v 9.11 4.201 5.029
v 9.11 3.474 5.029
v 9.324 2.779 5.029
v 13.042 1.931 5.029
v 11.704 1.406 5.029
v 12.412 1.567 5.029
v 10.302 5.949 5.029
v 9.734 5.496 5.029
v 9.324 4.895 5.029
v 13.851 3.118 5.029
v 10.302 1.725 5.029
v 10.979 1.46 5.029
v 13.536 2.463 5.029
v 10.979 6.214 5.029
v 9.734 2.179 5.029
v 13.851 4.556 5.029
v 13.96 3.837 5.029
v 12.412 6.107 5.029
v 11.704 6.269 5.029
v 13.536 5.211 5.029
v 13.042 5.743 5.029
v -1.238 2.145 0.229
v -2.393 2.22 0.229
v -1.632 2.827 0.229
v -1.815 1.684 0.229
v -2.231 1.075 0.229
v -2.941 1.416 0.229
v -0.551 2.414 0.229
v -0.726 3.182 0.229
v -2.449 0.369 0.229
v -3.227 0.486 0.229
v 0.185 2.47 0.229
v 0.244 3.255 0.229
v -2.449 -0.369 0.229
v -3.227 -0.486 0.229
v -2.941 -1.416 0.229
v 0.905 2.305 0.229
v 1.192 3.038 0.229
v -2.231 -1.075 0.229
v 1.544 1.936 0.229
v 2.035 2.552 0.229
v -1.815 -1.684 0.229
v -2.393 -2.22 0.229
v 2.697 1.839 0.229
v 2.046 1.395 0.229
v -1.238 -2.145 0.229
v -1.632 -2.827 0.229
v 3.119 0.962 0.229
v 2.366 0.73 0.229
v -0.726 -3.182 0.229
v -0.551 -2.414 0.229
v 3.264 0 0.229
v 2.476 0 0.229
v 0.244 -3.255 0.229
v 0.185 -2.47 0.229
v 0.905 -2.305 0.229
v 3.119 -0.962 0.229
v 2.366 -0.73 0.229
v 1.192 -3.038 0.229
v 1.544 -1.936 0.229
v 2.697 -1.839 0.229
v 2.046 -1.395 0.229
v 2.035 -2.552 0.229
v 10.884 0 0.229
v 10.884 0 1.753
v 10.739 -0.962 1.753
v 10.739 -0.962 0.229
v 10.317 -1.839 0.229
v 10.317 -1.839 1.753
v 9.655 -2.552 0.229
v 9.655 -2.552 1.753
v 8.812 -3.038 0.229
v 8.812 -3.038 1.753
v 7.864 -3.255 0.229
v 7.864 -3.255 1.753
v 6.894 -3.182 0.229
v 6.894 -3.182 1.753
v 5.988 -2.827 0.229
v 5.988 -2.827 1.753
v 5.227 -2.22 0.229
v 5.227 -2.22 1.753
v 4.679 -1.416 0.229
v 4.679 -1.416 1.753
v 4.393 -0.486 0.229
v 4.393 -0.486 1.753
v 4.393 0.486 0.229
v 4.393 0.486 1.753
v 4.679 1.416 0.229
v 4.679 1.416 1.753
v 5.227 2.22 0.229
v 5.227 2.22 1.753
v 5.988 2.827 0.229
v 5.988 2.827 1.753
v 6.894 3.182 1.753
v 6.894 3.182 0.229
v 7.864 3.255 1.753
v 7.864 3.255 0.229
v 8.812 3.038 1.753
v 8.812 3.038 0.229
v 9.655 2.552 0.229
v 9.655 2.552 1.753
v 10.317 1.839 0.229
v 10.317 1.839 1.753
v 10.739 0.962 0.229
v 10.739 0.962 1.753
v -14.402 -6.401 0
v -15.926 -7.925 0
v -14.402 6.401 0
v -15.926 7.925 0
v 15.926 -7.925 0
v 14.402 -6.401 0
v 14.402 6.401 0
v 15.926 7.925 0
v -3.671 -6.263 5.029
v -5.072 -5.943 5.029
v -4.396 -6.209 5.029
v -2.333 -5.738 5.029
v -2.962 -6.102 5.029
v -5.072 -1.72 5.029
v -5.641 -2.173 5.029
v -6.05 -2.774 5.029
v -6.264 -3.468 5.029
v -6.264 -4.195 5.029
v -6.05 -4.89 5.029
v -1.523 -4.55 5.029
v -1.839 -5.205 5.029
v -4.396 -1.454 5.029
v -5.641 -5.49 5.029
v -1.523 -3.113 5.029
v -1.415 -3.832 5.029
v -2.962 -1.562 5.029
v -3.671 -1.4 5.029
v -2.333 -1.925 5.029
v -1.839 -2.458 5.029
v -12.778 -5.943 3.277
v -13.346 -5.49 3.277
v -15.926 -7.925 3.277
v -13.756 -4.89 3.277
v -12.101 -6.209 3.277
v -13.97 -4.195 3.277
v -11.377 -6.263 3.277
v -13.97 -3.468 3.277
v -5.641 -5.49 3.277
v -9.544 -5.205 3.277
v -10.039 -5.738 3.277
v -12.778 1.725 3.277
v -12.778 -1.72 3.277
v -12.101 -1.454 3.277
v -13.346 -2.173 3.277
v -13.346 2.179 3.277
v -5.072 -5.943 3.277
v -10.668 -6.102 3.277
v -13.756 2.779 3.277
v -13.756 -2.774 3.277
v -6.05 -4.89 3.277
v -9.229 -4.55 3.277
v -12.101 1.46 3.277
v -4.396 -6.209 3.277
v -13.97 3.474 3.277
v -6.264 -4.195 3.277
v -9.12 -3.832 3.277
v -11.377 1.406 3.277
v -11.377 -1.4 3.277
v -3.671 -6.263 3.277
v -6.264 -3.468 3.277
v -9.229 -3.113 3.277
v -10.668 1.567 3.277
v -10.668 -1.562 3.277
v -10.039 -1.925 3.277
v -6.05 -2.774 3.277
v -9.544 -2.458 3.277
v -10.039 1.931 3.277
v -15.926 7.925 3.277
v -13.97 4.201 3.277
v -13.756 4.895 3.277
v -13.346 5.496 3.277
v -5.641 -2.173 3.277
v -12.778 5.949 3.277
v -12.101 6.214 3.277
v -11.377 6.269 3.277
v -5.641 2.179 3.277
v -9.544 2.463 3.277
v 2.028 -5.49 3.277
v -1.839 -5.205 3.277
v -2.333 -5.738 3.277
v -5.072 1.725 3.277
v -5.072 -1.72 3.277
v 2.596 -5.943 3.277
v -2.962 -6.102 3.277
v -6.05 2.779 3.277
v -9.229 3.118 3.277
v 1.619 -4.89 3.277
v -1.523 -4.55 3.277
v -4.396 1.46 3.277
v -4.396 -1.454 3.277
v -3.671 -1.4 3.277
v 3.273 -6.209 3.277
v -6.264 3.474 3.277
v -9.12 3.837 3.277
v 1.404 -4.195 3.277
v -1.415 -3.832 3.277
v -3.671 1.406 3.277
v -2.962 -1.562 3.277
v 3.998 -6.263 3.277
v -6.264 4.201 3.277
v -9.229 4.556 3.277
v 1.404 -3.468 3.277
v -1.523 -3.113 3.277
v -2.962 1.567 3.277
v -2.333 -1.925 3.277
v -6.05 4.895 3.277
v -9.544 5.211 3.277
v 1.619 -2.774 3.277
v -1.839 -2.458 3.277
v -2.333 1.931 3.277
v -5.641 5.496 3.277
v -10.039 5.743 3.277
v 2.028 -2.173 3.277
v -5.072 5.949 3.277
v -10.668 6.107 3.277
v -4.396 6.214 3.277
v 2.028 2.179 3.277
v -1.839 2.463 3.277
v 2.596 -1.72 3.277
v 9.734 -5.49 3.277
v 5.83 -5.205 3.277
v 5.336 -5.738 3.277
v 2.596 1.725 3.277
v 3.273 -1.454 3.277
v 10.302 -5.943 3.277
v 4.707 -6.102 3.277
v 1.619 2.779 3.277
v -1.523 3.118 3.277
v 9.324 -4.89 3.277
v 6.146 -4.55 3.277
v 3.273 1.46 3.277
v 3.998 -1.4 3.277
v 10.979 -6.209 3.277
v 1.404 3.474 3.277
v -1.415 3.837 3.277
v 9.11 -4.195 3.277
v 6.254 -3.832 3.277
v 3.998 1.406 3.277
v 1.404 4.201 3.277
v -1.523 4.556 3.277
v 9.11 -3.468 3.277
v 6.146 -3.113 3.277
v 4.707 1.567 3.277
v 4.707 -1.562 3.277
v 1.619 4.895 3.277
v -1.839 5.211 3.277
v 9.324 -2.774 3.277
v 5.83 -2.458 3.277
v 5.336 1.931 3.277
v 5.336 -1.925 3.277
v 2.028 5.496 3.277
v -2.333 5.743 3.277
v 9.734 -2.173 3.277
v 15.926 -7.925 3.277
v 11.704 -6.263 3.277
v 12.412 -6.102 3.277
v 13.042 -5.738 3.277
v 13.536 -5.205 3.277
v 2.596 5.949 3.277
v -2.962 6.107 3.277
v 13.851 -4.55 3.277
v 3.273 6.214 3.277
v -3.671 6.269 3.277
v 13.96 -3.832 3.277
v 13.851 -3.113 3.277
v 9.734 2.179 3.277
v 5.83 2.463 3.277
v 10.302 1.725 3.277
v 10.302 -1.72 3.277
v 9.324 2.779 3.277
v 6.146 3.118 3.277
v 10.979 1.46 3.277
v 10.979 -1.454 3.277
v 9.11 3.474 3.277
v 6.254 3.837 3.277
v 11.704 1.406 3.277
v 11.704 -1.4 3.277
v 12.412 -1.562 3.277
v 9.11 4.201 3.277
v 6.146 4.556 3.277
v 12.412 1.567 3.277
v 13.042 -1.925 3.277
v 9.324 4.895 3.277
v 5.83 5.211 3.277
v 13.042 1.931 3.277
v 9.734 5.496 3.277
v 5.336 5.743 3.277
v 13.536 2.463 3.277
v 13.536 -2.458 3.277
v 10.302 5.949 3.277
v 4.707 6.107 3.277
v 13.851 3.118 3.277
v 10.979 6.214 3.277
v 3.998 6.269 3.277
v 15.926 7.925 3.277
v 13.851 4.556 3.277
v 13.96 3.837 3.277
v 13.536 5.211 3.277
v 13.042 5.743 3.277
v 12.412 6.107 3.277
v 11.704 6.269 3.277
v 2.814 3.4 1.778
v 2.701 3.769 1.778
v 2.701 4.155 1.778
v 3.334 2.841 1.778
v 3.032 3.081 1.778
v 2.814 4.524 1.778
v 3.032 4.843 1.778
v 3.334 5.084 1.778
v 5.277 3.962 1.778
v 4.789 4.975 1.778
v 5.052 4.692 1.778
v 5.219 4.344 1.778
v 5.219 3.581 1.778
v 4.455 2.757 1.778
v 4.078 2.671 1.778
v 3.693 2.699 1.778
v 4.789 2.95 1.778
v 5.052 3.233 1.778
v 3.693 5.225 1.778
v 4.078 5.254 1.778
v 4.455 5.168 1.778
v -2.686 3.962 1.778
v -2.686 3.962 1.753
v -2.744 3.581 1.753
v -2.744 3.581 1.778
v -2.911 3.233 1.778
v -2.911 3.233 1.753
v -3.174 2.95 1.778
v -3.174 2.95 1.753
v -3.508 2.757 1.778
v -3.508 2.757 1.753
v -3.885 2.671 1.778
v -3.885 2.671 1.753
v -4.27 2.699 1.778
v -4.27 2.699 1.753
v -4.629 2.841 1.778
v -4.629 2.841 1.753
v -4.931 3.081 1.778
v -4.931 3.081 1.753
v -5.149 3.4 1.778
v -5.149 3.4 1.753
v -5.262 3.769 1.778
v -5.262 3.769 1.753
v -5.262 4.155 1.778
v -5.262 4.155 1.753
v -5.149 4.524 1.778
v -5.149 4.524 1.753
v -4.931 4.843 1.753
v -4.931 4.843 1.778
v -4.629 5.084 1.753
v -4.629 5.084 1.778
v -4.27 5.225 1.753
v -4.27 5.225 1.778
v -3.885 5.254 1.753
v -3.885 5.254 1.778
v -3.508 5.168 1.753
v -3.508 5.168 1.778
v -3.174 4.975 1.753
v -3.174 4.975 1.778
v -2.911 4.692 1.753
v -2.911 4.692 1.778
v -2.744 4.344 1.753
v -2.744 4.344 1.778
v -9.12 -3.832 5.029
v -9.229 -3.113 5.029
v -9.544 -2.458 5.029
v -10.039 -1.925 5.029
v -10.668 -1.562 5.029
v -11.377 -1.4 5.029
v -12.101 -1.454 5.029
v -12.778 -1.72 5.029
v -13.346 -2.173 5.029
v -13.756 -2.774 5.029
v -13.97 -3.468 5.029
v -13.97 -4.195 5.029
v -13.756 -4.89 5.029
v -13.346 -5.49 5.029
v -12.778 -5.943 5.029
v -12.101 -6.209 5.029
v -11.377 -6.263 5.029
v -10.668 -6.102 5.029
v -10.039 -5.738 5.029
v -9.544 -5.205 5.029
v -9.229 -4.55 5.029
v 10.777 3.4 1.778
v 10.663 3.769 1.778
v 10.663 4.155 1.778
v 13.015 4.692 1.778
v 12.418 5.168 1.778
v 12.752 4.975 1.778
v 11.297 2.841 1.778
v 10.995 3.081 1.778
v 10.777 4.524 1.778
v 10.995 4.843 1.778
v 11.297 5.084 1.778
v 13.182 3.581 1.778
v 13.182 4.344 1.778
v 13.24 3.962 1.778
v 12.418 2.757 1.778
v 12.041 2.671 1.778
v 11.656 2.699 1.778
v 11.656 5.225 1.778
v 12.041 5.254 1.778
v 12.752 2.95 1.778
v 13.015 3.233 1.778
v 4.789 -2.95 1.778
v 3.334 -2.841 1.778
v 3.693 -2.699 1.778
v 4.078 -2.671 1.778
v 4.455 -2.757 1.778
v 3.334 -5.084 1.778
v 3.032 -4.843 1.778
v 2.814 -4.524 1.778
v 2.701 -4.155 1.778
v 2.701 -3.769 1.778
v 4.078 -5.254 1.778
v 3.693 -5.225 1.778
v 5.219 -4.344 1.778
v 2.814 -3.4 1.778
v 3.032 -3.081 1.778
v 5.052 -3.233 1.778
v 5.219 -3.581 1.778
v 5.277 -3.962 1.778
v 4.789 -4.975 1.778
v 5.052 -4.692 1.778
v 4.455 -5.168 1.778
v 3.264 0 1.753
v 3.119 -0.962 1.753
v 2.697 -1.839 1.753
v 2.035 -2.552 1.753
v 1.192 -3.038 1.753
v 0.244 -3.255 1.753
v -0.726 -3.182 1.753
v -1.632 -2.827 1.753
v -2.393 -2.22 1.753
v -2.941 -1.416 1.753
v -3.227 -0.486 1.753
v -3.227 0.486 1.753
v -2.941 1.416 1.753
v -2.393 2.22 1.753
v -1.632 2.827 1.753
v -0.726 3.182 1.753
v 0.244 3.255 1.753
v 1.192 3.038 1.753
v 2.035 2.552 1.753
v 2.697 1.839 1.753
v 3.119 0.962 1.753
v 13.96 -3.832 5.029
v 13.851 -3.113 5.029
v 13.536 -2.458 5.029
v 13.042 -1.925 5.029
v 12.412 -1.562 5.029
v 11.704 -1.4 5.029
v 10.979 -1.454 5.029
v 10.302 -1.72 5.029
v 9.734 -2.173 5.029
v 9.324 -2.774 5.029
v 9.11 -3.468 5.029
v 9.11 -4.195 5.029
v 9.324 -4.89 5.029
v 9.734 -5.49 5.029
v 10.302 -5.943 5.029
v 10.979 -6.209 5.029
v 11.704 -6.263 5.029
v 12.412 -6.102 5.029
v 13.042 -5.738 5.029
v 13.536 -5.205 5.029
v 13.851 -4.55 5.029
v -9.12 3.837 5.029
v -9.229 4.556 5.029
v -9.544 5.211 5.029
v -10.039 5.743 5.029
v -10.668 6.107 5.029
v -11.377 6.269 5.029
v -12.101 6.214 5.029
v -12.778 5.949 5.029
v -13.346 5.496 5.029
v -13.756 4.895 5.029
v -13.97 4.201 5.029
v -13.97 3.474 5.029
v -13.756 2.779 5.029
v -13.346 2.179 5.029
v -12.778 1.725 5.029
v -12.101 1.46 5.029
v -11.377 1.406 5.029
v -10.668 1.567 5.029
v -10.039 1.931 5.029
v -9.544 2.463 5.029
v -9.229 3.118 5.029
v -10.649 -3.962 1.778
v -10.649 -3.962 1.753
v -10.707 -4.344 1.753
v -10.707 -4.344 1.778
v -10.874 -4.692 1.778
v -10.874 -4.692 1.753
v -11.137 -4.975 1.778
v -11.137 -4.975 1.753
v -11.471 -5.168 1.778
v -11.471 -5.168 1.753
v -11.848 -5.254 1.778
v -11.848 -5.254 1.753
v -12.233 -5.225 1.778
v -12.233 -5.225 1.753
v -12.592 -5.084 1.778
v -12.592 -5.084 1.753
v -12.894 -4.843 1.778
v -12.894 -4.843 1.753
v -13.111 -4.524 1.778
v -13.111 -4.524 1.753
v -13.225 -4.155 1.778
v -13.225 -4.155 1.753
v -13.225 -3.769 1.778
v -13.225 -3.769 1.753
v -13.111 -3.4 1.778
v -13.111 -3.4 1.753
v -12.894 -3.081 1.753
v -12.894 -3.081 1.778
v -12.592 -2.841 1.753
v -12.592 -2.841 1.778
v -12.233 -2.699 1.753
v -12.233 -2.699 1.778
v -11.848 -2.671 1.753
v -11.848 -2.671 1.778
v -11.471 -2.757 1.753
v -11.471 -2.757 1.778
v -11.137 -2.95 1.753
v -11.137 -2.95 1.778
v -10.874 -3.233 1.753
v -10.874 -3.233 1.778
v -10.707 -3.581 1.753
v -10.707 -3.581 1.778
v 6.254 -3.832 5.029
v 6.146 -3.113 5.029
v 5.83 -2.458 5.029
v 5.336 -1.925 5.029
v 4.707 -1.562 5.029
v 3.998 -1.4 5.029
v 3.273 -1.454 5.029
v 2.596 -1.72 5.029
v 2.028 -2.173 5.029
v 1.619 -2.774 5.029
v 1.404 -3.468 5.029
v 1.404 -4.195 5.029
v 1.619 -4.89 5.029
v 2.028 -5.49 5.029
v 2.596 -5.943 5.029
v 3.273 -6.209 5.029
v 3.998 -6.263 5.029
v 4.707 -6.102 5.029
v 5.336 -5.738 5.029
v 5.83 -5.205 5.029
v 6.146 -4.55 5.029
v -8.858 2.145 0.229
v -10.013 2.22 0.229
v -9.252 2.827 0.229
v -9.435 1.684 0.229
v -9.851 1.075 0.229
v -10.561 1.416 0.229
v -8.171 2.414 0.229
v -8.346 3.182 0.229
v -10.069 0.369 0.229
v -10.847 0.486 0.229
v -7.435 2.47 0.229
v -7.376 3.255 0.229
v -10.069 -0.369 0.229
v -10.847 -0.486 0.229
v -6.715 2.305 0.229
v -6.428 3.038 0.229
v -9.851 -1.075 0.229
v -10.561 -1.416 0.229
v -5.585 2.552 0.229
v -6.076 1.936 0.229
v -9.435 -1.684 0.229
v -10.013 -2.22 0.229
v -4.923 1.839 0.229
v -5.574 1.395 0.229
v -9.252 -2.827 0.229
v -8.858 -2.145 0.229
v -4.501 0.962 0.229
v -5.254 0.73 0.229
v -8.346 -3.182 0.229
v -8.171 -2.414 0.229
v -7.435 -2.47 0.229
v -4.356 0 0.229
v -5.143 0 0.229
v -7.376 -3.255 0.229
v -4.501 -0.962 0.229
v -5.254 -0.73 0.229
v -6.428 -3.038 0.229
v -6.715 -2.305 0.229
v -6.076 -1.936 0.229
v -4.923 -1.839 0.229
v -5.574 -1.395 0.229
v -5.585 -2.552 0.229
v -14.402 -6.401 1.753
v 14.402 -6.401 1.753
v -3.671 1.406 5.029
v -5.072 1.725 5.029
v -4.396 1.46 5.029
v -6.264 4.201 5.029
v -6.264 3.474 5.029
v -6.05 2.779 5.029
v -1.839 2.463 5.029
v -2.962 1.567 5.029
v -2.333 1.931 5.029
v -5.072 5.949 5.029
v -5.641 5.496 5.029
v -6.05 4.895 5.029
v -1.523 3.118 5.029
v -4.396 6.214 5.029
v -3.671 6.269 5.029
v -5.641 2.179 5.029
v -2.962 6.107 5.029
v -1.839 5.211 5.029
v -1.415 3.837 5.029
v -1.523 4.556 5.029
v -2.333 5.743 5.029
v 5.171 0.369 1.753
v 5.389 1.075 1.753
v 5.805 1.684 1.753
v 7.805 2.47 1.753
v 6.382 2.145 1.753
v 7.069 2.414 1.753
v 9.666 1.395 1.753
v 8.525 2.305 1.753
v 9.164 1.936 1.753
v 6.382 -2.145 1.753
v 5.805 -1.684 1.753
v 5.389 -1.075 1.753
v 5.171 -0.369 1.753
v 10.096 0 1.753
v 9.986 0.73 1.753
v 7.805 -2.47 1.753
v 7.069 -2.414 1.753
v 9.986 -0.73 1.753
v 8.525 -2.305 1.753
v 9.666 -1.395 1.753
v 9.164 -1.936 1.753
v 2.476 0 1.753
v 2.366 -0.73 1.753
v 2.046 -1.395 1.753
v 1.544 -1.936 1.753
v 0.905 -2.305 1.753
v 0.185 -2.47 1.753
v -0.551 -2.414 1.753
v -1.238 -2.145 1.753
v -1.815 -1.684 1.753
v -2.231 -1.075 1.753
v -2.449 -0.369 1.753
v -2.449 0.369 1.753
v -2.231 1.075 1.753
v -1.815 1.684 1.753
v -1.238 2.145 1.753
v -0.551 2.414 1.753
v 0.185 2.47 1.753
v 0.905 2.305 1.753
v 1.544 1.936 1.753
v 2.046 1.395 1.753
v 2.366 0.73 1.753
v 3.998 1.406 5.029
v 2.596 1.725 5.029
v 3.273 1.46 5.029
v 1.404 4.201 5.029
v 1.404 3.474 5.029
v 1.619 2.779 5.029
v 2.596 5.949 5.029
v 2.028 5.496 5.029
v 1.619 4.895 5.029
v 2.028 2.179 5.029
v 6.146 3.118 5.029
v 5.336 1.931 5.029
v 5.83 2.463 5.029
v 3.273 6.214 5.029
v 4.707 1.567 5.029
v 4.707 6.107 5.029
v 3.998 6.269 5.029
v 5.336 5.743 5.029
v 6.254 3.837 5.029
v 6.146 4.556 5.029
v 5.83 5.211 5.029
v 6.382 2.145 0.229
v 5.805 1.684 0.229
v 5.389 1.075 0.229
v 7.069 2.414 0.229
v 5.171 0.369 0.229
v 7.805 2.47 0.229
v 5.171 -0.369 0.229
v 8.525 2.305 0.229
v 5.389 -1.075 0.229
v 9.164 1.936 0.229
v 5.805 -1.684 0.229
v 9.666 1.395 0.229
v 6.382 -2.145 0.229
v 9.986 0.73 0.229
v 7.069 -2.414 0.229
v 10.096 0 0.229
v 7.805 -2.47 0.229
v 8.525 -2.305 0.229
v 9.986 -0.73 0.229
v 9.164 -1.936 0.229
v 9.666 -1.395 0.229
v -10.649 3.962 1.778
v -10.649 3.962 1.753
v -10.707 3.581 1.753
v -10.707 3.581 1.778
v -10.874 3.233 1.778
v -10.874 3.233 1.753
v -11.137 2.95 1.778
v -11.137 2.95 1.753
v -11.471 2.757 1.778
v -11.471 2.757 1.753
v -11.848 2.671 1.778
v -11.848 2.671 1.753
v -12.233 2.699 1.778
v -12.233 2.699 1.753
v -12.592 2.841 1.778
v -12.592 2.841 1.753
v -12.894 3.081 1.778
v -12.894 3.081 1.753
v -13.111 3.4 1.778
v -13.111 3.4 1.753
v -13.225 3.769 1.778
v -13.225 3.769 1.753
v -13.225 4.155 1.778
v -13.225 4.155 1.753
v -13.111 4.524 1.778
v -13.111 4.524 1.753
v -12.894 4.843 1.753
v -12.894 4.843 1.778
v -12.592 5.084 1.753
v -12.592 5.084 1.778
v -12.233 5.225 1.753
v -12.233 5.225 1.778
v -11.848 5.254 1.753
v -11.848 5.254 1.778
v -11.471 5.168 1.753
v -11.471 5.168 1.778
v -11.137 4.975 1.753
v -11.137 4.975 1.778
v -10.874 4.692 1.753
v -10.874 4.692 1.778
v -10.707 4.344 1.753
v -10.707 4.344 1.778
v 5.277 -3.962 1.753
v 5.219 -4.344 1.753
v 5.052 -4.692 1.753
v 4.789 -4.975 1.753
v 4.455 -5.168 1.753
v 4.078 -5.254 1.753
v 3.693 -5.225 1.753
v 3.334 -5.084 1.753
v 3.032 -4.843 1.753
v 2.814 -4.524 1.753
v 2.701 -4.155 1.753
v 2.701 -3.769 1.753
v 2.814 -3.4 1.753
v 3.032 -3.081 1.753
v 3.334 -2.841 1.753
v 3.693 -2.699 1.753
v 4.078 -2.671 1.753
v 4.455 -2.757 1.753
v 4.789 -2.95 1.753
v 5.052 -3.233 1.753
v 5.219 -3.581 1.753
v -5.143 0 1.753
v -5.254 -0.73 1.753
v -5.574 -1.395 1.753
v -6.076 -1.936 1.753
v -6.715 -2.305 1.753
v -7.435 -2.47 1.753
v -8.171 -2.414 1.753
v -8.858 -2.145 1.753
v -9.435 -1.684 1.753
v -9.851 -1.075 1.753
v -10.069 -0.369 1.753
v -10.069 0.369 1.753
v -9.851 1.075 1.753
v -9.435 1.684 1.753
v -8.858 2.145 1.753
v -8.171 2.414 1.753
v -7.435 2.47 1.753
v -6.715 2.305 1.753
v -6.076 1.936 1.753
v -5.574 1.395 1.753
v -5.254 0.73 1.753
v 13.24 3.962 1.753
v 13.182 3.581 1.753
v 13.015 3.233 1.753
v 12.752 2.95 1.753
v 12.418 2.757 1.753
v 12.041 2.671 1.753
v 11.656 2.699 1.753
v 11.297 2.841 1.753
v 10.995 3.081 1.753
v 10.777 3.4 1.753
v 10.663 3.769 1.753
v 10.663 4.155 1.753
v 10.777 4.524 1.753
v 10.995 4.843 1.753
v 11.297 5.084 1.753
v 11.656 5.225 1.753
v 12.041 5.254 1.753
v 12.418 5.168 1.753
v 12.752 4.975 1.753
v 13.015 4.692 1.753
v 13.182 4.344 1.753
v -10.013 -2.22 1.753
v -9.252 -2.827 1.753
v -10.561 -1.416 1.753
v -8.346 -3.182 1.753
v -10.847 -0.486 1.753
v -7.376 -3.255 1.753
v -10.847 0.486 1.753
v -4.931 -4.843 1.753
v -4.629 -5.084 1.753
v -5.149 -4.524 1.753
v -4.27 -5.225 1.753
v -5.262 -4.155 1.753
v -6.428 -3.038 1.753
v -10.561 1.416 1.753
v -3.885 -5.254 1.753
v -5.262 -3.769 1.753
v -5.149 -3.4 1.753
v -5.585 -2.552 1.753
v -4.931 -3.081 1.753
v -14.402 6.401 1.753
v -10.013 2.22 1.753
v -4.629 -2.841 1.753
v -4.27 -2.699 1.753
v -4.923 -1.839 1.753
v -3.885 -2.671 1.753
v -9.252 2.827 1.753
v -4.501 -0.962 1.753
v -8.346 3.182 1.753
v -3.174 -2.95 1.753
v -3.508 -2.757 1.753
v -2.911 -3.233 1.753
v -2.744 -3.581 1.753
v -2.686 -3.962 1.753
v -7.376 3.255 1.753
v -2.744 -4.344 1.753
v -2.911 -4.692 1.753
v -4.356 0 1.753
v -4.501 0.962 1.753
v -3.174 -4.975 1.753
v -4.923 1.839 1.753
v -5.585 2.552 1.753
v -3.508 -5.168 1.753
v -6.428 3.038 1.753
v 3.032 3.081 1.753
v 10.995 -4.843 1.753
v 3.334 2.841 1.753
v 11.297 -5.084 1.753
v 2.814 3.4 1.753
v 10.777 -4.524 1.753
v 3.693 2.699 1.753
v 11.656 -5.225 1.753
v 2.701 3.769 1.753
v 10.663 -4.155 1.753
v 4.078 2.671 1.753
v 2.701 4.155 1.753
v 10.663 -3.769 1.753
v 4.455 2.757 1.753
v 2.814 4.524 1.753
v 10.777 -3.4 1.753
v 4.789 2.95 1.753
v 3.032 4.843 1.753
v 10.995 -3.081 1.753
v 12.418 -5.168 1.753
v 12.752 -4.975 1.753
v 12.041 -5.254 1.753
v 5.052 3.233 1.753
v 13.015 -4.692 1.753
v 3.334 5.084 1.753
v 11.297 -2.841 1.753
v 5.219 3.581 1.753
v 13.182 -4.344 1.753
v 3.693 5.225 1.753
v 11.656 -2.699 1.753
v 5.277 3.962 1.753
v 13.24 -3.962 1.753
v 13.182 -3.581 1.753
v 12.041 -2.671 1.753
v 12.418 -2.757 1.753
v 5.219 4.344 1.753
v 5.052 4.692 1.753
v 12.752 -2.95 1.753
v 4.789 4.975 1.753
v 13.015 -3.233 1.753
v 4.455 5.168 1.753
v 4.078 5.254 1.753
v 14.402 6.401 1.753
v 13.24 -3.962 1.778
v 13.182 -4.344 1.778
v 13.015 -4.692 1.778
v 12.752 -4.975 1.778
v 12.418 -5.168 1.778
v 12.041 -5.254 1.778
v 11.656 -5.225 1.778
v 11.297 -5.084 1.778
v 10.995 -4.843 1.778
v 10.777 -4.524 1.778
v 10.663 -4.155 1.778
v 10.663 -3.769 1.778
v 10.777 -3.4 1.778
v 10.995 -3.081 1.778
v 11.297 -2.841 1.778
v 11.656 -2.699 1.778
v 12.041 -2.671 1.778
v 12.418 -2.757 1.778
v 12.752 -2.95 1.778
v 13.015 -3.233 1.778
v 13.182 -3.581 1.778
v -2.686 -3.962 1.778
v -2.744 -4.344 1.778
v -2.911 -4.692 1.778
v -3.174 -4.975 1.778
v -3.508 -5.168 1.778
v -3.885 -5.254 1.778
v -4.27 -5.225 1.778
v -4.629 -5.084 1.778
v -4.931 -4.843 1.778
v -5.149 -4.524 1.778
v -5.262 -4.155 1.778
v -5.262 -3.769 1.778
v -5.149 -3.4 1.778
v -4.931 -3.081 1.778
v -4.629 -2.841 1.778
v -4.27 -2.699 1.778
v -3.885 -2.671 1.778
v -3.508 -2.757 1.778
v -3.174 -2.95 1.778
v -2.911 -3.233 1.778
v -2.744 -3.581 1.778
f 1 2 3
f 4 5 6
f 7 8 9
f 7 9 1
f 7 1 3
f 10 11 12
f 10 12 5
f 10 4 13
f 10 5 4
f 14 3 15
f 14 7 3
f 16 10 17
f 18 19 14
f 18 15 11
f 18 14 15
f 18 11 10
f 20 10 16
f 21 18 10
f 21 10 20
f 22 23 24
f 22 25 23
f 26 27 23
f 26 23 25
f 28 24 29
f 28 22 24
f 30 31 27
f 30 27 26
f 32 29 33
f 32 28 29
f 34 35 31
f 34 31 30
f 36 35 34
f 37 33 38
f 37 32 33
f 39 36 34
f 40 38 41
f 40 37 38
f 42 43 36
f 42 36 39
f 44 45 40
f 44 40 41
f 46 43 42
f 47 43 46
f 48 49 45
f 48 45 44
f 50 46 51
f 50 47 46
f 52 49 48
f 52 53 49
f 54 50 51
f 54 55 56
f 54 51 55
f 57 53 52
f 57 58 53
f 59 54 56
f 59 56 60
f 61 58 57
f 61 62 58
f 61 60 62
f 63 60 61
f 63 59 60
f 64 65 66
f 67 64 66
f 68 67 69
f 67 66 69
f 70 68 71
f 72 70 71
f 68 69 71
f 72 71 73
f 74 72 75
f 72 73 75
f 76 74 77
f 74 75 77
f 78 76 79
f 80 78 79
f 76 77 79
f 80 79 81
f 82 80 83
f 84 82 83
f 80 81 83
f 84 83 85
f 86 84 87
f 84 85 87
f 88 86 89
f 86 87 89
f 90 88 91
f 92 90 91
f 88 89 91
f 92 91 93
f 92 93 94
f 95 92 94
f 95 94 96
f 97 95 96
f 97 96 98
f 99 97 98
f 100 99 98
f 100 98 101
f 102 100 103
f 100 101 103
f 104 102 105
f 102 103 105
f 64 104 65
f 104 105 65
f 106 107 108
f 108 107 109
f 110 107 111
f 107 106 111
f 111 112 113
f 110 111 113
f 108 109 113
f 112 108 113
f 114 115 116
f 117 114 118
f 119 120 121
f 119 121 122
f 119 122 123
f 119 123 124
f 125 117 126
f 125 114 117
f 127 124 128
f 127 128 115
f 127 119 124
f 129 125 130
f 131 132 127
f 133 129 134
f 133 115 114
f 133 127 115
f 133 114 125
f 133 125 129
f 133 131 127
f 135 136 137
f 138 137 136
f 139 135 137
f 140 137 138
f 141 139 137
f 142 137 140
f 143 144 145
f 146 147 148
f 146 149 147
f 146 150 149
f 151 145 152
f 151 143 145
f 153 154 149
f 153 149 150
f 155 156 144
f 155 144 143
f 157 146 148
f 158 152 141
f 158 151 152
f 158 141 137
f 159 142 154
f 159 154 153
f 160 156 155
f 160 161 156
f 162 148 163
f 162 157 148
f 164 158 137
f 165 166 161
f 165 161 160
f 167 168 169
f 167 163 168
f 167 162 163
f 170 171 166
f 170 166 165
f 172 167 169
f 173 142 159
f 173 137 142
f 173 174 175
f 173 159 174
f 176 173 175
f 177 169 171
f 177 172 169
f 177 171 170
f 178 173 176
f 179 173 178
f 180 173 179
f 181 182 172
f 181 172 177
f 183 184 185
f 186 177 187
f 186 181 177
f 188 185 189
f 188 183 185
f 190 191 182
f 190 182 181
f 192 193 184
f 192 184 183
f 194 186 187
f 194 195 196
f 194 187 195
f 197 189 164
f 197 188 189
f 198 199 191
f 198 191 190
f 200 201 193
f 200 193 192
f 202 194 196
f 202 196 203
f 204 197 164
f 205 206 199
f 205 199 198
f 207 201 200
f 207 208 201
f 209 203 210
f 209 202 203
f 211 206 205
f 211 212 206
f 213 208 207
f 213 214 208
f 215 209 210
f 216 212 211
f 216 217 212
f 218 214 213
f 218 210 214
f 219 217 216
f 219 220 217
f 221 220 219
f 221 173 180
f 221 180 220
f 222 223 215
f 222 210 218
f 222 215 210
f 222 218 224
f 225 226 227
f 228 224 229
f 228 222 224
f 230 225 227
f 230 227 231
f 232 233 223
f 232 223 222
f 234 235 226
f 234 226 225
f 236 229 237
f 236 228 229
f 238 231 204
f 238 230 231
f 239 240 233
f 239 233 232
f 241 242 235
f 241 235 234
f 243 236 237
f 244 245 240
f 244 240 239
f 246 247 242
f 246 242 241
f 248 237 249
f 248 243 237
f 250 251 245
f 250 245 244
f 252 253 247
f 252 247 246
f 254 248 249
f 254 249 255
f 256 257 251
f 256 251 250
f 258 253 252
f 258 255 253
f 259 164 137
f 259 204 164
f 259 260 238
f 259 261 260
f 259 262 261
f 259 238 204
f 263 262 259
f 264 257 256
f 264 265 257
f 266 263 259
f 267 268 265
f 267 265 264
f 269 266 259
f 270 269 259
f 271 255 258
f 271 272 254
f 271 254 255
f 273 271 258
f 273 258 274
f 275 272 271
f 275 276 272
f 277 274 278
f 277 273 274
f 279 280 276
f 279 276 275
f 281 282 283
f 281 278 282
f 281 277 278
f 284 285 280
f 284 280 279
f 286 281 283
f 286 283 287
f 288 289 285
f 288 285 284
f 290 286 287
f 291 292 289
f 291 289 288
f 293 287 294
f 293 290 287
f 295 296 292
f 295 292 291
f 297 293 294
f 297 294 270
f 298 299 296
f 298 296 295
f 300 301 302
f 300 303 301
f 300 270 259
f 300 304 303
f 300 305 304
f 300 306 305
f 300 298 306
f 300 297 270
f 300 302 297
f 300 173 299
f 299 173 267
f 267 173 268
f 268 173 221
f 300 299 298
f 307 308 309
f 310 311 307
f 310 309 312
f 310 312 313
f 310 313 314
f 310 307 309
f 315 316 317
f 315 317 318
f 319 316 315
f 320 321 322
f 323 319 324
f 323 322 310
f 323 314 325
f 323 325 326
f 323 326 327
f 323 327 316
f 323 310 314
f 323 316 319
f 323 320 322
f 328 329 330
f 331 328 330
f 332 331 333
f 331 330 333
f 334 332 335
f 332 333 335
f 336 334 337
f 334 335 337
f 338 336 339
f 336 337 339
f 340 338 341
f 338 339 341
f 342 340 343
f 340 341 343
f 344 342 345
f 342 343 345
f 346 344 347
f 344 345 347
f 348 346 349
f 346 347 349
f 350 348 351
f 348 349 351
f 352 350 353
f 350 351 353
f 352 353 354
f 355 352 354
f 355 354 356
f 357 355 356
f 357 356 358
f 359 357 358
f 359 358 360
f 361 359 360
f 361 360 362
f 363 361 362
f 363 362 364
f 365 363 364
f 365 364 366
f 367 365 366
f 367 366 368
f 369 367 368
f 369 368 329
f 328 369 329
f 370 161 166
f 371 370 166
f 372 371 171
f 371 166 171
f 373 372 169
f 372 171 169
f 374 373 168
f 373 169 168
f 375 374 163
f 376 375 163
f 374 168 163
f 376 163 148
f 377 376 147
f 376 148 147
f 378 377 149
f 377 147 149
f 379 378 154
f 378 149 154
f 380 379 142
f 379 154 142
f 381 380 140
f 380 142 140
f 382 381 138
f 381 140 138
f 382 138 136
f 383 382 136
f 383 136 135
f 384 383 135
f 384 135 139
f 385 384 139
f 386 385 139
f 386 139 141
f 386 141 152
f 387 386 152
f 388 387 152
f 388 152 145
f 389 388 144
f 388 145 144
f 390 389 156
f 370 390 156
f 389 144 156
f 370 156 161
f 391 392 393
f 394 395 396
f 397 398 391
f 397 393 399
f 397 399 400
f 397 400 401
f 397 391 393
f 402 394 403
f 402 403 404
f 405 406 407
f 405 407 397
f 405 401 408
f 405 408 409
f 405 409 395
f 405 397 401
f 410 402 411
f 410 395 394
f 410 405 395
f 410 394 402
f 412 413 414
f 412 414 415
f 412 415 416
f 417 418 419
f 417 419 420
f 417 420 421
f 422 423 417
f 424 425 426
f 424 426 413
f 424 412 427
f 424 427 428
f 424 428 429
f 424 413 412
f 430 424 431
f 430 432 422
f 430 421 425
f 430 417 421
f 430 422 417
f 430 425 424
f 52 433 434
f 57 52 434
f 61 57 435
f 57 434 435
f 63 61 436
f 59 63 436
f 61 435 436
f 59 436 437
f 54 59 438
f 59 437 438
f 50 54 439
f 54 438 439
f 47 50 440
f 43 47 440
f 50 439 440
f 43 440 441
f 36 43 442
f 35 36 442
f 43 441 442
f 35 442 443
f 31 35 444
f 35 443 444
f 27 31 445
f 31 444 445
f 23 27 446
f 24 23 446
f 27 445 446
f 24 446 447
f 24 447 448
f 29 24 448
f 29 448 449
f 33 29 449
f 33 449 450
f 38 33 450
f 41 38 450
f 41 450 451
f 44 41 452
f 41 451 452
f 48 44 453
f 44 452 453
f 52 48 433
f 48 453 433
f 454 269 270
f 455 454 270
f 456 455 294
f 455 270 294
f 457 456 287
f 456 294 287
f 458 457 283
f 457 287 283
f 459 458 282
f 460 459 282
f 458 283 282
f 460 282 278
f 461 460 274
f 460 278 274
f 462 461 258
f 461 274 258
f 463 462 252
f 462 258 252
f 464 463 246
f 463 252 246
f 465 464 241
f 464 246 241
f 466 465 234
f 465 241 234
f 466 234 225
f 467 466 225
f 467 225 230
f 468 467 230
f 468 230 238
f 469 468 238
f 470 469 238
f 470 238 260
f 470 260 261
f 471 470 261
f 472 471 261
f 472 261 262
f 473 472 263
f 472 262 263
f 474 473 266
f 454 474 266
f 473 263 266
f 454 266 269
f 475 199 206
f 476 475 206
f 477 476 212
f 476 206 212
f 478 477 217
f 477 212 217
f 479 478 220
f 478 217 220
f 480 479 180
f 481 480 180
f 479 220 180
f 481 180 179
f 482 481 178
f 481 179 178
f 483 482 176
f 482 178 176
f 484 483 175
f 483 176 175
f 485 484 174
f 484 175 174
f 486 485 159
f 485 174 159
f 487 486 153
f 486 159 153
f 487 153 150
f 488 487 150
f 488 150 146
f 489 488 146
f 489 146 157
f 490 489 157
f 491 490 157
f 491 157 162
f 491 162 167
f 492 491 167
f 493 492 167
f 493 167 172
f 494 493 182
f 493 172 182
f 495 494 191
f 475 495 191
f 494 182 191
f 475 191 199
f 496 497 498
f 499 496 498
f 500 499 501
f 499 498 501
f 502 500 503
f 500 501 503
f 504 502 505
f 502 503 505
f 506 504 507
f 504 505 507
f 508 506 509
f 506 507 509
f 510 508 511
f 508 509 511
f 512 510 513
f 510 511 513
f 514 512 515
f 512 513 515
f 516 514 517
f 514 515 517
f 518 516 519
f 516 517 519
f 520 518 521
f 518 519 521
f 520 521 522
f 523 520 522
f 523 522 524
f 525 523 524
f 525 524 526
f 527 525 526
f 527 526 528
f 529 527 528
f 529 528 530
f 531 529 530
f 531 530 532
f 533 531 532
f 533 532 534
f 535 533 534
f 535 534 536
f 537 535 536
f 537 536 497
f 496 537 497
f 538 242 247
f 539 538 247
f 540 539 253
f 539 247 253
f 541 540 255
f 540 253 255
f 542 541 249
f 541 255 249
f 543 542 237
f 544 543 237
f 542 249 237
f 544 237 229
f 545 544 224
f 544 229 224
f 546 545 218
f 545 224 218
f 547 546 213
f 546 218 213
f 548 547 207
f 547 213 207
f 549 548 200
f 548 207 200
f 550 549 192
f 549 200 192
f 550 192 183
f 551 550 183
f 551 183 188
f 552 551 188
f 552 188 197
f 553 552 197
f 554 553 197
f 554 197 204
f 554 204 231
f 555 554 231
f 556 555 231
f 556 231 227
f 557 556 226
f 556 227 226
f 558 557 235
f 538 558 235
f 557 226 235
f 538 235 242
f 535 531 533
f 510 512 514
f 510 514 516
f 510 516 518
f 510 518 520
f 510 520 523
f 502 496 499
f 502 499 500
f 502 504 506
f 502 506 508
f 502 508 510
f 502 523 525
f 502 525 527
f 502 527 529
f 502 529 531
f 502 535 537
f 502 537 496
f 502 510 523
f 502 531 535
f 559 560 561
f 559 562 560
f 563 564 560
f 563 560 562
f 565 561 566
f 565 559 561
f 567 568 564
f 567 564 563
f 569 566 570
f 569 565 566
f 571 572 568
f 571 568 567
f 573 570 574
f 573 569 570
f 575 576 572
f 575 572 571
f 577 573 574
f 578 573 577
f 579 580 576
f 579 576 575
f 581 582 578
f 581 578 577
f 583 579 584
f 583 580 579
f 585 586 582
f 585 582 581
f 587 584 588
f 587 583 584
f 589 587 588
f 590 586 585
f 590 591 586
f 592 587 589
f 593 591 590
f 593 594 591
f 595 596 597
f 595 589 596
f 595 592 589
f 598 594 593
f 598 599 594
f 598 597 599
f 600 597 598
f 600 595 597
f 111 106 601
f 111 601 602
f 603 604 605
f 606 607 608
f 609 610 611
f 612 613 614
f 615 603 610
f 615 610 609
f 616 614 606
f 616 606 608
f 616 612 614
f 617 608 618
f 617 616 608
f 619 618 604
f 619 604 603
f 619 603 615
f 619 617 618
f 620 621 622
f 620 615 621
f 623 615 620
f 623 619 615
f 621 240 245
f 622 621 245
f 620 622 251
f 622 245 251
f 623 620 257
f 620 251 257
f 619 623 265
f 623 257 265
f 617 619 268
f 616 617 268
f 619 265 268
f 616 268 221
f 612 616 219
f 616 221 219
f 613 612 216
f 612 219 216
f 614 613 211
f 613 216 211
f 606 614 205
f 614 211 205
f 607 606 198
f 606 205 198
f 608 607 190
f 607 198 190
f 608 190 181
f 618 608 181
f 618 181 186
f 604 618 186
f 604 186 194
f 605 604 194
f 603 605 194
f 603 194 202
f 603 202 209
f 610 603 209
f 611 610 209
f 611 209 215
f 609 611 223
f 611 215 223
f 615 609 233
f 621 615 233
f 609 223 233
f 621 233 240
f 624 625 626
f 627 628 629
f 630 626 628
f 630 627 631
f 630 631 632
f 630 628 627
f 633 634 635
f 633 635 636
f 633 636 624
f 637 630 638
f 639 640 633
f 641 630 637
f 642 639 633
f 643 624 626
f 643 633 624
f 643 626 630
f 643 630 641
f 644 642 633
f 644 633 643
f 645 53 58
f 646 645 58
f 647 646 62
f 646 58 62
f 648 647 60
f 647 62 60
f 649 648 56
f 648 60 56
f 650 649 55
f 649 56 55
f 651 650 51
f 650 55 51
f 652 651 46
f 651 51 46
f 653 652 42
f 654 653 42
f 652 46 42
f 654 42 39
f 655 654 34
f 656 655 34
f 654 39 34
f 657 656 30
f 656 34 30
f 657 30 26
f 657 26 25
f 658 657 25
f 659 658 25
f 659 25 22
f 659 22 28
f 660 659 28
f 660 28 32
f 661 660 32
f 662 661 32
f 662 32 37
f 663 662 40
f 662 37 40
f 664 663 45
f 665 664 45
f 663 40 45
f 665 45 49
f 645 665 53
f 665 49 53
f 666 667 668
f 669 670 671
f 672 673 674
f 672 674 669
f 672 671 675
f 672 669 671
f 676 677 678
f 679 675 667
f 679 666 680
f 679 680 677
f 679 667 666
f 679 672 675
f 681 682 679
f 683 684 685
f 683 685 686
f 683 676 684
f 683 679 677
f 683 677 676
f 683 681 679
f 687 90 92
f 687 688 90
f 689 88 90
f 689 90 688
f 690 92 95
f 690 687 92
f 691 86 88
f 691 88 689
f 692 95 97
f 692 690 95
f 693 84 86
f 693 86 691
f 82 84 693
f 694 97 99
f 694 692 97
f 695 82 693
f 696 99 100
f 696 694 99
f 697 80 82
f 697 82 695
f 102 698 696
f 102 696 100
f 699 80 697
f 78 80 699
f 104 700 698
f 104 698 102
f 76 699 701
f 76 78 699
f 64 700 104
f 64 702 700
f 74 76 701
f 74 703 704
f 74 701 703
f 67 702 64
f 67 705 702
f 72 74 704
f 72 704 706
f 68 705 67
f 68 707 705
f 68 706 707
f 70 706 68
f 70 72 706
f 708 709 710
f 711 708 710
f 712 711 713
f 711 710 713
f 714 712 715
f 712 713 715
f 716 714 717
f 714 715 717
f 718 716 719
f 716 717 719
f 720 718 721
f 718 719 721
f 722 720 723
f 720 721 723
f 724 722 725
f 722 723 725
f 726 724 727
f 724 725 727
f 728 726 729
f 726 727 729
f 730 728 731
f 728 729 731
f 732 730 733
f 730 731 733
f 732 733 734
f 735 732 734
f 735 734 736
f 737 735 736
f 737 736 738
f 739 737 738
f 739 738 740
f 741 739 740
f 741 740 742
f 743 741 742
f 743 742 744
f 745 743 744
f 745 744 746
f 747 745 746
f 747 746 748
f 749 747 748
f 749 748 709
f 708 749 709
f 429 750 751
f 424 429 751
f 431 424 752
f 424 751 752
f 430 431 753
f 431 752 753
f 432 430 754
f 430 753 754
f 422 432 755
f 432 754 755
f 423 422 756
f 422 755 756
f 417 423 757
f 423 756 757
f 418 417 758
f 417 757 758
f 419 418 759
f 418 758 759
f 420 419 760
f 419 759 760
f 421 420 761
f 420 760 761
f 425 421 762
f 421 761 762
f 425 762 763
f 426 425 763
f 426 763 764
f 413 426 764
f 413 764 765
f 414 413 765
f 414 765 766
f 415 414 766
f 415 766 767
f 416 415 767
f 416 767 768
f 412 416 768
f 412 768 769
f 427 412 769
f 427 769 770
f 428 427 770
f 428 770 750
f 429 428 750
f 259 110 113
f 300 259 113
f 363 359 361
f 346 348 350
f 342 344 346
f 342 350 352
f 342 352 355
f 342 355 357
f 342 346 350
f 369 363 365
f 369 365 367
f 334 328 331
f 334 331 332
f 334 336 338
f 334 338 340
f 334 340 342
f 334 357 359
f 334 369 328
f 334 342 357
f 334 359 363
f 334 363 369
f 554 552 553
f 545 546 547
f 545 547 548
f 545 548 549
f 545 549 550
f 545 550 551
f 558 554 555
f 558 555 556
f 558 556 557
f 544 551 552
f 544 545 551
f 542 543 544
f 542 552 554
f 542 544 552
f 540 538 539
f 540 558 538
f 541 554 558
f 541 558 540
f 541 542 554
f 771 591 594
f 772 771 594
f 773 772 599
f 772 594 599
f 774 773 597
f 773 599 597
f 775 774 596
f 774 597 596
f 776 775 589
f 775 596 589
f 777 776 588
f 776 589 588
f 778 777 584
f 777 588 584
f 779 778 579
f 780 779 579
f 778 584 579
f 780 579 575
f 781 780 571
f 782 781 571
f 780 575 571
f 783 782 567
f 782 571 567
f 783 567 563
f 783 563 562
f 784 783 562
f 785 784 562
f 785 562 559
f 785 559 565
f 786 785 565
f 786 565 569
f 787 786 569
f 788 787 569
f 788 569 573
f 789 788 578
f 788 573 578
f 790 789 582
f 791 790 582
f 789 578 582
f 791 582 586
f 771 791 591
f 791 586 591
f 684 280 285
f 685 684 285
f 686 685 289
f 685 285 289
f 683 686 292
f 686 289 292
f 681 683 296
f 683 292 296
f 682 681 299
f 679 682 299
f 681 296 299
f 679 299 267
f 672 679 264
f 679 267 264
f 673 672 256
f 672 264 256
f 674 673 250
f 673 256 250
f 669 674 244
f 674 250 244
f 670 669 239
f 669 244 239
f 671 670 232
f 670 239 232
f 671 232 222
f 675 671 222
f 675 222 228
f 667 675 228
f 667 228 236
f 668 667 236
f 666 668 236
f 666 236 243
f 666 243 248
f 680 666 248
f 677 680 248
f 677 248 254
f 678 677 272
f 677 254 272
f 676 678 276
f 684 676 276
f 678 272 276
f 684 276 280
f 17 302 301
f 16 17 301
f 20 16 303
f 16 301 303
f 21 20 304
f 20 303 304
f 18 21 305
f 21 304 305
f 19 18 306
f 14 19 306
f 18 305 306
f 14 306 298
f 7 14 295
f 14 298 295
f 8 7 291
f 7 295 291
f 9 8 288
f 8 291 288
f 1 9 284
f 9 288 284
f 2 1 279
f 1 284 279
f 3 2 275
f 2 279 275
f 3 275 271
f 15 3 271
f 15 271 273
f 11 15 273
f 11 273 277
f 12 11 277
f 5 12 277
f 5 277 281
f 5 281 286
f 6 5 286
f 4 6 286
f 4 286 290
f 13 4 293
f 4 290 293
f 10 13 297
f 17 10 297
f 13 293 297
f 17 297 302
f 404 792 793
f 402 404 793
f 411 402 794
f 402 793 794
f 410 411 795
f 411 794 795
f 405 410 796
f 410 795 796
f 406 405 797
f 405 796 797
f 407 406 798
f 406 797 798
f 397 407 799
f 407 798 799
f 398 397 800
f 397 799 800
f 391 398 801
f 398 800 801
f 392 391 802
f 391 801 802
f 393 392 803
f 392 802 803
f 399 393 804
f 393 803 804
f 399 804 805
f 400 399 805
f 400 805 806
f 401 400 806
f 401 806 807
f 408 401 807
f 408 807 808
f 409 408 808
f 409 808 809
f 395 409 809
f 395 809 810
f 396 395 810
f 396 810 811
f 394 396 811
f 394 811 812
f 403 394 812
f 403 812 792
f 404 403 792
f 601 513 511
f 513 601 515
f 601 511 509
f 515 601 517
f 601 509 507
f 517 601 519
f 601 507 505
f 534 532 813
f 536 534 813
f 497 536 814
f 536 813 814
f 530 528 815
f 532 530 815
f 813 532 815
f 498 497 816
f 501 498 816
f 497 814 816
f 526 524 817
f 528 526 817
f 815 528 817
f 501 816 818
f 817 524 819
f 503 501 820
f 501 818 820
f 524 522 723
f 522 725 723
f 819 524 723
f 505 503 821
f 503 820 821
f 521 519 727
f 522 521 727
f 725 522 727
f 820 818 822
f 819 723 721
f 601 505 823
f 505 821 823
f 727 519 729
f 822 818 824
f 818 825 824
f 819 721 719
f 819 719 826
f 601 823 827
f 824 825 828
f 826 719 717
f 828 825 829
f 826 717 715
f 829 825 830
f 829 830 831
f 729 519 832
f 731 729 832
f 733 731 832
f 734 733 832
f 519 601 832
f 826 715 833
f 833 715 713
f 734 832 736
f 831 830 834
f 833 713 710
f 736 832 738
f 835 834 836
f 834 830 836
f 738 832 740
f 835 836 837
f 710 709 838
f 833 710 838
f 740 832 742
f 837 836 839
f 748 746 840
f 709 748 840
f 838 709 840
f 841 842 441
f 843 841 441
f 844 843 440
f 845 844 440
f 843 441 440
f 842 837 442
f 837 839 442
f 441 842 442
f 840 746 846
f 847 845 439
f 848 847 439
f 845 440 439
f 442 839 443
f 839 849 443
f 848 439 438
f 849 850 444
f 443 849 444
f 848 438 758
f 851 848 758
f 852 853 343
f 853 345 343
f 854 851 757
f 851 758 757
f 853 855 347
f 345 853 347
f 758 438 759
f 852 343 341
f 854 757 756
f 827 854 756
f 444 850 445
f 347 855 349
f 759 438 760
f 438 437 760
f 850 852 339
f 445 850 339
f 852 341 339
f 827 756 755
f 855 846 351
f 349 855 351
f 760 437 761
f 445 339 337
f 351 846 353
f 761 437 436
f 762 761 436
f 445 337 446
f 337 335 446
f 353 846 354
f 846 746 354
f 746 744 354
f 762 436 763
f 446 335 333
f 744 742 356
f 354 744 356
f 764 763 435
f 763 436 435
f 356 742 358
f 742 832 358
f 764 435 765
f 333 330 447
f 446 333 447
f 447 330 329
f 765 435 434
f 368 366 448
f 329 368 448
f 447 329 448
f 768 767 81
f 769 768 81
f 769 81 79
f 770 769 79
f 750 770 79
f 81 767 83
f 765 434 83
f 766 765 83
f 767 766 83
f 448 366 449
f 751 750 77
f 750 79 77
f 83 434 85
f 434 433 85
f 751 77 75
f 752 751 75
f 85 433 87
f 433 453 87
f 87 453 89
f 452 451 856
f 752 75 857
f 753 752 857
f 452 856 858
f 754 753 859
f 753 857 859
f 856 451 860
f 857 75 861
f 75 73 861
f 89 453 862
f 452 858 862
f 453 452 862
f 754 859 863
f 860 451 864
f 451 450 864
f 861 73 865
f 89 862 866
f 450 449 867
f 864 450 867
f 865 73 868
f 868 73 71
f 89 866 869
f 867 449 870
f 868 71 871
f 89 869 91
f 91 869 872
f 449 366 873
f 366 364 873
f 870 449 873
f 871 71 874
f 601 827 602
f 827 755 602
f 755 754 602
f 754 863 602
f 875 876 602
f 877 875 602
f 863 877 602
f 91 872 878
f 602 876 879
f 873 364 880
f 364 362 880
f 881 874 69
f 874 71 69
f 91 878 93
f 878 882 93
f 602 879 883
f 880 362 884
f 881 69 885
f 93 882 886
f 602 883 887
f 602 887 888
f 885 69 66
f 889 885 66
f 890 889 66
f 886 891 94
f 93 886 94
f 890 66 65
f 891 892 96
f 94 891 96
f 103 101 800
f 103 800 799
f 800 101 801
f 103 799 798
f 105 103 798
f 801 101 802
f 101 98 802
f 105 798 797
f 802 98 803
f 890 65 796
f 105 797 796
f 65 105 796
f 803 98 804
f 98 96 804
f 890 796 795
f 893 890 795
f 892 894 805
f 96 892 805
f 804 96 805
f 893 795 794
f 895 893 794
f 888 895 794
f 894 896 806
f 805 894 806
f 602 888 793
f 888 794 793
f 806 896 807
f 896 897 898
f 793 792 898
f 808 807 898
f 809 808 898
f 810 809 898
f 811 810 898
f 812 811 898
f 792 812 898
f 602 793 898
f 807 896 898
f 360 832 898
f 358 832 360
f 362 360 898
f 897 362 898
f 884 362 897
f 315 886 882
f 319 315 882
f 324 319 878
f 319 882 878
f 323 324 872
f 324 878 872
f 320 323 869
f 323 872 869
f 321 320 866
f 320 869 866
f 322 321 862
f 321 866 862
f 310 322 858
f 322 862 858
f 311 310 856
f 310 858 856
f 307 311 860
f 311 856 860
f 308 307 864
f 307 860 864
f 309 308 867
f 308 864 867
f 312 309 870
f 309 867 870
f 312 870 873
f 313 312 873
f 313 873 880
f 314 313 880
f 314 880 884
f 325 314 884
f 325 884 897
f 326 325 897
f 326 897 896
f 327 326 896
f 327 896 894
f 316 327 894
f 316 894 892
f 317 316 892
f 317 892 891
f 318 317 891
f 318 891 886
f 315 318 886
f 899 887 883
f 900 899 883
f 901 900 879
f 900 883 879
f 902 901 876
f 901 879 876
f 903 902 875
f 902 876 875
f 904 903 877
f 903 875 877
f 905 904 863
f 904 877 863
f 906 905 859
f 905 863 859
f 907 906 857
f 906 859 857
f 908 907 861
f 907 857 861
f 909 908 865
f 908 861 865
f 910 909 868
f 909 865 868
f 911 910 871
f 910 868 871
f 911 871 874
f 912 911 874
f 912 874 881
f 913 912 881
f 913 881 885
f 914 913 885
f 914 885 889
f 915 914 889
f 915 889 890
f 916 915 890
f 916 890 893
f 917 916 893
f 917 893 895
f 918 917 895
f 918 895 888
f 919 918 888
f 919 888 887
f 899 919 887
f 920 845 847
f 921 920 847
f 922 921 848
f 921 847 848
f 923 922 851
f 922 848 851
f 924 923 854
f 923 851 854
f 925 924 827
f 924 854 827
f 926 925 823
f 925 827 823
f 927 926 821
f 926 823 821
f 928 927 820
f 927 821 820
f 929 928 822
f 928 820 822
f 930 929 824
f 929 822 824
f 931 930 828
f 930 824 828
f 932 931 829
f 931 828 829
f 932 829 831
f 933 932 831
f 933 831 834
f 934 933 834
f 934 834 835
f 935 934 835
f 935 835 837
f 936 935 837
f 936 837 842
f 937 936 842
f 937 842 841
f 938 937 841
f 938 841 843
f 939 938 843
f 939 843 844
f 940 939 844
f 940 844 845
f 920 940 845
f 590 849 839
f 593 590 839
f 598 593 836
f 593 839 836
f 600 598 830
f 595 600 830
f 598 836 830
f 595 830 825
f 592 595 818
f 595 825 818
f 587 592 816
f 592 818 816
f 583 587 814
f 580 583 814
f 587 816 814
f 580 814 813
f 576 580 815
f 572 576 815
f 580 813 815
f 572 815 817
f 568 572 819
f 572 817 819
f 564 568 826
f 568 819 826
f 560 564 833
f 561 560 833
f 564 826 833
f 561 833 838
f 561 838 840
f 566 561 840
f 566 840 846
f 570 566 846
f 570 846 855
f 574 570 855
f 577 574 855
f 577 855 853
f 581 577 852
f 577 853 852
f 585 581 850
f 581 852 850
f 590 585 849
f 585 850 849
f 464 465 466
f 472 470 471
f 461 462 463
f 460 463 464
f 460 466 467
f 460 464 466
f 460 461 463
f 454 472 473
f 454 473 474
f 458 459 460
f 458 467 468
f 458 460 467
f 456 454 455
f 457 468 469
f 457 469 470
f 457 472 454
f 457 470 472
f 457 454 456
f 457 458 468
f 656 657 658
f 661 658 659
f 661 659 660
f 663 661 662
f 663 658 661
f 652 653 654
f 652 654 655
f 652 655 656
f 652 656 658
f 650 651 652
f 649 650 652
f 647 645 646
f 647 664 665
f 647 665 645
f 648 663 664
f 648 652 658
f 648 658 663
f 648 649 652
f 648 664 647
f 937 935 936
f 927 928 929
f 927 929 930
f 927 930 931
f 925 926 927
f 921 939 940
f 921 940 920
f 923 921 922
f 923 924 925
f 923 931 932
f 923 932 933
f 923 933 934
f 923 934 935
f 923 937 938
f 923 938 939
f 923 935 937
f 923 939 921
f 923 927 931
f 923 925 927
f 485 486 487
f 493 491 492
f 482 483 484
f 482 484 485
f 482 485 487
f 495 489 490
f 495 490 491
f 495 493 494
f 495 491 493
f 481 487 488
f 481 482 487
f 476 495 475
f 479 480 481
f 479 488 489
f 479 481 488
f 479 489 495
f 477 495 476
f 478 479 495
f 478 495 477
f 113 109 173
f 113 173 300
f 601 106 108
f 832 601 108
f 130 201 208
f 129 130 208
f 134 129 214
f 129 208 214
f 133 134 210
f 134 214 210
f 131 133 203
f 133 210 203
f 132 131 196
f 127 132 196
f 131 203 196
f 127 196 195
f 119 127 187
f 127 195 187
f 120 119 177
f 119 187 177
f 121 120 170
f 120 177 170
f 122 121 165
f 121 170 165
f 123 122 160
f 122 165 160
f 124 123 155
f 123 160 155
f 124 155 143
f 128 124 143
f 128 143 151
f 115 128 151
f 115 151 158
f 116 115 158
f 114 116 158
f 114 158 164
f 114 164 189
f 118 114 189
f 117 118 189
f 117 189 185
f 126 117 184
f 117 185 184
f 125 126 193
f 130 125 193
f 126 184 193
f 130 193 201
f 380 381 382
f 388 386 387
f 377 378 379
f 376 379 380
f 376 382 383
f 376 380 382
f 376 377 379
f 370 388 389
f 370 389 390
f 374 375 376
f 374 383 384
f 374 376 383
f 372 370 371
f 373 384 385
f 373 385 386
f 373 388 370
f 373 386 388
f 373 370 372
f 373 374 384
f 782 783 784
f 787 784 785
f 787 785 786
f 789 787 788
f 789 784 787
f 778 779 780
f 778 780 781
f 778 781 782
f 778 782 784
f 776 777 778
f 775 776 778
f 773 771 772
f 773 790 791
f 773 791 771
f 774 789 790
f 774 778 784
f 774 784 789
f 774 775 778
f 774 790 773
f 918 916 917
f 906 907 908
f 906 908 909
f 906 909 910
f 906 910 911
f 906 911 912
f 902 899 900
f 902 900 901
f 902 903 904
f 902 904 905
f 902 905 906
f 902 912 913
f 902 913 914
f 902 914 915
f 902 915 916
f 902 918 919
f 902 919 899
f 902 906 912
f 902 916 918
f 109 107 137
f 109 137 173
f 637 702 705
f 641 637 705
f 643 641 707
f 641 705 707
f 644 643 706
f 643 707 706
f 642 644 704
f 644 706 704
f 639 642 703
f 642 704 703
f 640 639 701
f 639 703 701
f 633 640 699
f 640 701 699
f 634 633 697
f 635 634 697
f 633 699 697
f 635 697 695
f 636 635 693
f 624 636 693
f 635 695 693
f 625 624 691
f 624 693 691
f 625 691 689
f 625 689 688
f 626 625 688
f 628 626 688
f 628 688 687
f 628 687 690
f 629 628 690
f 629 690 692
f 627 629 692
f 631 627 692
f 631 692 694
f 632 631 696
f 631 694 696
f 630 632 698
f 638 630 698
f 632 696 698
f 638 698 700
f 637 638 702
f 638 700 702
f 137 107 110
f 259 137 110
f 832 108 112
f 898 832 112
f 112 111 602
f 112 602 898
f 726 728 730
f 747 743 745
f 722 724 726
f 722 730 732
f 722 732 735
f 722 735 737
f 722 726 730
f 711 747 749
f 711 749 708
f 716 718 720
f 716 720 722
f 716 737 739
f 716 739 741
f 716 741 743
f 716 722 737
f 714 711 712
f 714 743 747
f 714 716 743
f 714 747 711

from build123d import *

# Parameters (mm, degrees)
F0_W      = 31.8516
F0_H      = 15.8496
F1_DEPTH  = 3.2766
F2_T      = -1.524
F3_R      = 3.2639
F4_DEPTH  = 1.524
F5_R      = 2.4765
F8_DEPTH  = 1.524
F6_R      = 2.4765
F9_DEPTH  = 1.524
F7_R      = 2.4765
F10_DEPTH = 1.524
F11_R     = 2.4384
F12_DEPTH = 1.7526
F13_R     = 1.2954
F14_DEPTH = 1.778


with BuildPart() as f1:
    # F0 (on Top) → F1 (new body)
    with BuildSketch(Plane.XY):
        Rectangle(F0_W, F0_H)
    extrude(amount=F1_DEPTH)

    # F2
    f2_openings = [f1.faces().sort_by_distance(p)[0] for p in [
        (0, 0, 0),
    ]]
    offset(amount=F2_T, openings=f2_openings)

    # F3 (on face) → F4 (join)
    with BuildSketch(Plane(origin=(0, 0, 1.7526), x_dir=(1, 0, 0), z_dir=(0, 0, -1))):
        Circle(F3_R)
        with Locations((-7.62, 0)):
            Circle(F3_R)
        with Locations((7.62, 0)):
            Circle(F3_R)
    extrude(amount=F4_DEPTH)

    # F5 (on face) → F8 (cut)
    with BuildSketch(Plane(origin=(0, 0, 0.2286), x_dir=(1, 0, 0), z_dir=(0, 0, -1))):
        Circle(F5_R)
    extrude(amount=-F8_DEPTH, mode=Mode.SUBTRACT)

    # F6 (on face) → F9 (cut)
    with BuildSketch(Plane(origin=(0, 0, 0.2286), x_dir=(1, 0, 0), z_dir=(0, 0, -1))):
        with Locations((-7.62, 0)):
            Circle(F6_R)
    extrude(amount=-F9_DEPTH, mode=Mode.SUBTRACT)

    # F7 (on face) → F10 (cut)
    with BuildSketch(Plane(origin=(0, 0, 0.2286), x_dir=(1, 0, 0), z_dir=(0, 0, -1))):
        with Locations((7.62, 0)):
            Circle(F7_R)
    extrude(amount=-F10_DEPTH, mode=Mode.SUBTRACT)

    # F11 (on face) → F12 (join)
    with BuildSketch(Plane.XY.offset(3.2766)):
        with Locations((-11.55889, 3.837082)):
            Circle(F11_R)
        with Locations((-3.853228, 3.837082)):
            Circle(F11_R)
        with Locations((3.815653, 3.837082)):
            Circle(F11_R)
        with Locations((11.521315, 3.837082)):
            Circle(F11_R)
        with Locations((11.521315, -3.831711)):
            Circle(F11_R)
        with Locations((3.815653, -3.831711)):
            Circle(F11_R)
        with Locations((-3.853228, -3.831711)):
            Circle(F11_R)
        with Locations((-11.55889, -3.831711)):
            Circle(F11_R)
    extrude(amount=F12_DEPTH)

    # F13 (on face) → F14 (cut)
    with BuildSketch(Plane(origin=(0, 0, 0), x_dir=(1, 0, 0), z_dir=(0, 0, -1))):
        with Locations((-3.98145, 3.9624)):
            Circle(F13_R)
        with Locations((-11.94435, 3.9624)):
            Circle(F13_R)
        with Locations((-11.94435, -3.9624)):
            Circle(F13_R)
        with Locations((-3.98145, -3.9624)):
            Circle(F13_R)
        with Locations((3.98145, -3.9624)):
            Circle(F13_R)
        with Locations((11.94435, -3.9624)):
            Circle(F13_R)
        with Locations((11.94435, 3.9624)):
            Circle(F13_R)
        with Locations((3.98145, 3.9624)):
            Circle(F13_R)
    extrude(amount=-F14_DEPTH, mode=Mode.SUBTRACT)


solid = f1.part
